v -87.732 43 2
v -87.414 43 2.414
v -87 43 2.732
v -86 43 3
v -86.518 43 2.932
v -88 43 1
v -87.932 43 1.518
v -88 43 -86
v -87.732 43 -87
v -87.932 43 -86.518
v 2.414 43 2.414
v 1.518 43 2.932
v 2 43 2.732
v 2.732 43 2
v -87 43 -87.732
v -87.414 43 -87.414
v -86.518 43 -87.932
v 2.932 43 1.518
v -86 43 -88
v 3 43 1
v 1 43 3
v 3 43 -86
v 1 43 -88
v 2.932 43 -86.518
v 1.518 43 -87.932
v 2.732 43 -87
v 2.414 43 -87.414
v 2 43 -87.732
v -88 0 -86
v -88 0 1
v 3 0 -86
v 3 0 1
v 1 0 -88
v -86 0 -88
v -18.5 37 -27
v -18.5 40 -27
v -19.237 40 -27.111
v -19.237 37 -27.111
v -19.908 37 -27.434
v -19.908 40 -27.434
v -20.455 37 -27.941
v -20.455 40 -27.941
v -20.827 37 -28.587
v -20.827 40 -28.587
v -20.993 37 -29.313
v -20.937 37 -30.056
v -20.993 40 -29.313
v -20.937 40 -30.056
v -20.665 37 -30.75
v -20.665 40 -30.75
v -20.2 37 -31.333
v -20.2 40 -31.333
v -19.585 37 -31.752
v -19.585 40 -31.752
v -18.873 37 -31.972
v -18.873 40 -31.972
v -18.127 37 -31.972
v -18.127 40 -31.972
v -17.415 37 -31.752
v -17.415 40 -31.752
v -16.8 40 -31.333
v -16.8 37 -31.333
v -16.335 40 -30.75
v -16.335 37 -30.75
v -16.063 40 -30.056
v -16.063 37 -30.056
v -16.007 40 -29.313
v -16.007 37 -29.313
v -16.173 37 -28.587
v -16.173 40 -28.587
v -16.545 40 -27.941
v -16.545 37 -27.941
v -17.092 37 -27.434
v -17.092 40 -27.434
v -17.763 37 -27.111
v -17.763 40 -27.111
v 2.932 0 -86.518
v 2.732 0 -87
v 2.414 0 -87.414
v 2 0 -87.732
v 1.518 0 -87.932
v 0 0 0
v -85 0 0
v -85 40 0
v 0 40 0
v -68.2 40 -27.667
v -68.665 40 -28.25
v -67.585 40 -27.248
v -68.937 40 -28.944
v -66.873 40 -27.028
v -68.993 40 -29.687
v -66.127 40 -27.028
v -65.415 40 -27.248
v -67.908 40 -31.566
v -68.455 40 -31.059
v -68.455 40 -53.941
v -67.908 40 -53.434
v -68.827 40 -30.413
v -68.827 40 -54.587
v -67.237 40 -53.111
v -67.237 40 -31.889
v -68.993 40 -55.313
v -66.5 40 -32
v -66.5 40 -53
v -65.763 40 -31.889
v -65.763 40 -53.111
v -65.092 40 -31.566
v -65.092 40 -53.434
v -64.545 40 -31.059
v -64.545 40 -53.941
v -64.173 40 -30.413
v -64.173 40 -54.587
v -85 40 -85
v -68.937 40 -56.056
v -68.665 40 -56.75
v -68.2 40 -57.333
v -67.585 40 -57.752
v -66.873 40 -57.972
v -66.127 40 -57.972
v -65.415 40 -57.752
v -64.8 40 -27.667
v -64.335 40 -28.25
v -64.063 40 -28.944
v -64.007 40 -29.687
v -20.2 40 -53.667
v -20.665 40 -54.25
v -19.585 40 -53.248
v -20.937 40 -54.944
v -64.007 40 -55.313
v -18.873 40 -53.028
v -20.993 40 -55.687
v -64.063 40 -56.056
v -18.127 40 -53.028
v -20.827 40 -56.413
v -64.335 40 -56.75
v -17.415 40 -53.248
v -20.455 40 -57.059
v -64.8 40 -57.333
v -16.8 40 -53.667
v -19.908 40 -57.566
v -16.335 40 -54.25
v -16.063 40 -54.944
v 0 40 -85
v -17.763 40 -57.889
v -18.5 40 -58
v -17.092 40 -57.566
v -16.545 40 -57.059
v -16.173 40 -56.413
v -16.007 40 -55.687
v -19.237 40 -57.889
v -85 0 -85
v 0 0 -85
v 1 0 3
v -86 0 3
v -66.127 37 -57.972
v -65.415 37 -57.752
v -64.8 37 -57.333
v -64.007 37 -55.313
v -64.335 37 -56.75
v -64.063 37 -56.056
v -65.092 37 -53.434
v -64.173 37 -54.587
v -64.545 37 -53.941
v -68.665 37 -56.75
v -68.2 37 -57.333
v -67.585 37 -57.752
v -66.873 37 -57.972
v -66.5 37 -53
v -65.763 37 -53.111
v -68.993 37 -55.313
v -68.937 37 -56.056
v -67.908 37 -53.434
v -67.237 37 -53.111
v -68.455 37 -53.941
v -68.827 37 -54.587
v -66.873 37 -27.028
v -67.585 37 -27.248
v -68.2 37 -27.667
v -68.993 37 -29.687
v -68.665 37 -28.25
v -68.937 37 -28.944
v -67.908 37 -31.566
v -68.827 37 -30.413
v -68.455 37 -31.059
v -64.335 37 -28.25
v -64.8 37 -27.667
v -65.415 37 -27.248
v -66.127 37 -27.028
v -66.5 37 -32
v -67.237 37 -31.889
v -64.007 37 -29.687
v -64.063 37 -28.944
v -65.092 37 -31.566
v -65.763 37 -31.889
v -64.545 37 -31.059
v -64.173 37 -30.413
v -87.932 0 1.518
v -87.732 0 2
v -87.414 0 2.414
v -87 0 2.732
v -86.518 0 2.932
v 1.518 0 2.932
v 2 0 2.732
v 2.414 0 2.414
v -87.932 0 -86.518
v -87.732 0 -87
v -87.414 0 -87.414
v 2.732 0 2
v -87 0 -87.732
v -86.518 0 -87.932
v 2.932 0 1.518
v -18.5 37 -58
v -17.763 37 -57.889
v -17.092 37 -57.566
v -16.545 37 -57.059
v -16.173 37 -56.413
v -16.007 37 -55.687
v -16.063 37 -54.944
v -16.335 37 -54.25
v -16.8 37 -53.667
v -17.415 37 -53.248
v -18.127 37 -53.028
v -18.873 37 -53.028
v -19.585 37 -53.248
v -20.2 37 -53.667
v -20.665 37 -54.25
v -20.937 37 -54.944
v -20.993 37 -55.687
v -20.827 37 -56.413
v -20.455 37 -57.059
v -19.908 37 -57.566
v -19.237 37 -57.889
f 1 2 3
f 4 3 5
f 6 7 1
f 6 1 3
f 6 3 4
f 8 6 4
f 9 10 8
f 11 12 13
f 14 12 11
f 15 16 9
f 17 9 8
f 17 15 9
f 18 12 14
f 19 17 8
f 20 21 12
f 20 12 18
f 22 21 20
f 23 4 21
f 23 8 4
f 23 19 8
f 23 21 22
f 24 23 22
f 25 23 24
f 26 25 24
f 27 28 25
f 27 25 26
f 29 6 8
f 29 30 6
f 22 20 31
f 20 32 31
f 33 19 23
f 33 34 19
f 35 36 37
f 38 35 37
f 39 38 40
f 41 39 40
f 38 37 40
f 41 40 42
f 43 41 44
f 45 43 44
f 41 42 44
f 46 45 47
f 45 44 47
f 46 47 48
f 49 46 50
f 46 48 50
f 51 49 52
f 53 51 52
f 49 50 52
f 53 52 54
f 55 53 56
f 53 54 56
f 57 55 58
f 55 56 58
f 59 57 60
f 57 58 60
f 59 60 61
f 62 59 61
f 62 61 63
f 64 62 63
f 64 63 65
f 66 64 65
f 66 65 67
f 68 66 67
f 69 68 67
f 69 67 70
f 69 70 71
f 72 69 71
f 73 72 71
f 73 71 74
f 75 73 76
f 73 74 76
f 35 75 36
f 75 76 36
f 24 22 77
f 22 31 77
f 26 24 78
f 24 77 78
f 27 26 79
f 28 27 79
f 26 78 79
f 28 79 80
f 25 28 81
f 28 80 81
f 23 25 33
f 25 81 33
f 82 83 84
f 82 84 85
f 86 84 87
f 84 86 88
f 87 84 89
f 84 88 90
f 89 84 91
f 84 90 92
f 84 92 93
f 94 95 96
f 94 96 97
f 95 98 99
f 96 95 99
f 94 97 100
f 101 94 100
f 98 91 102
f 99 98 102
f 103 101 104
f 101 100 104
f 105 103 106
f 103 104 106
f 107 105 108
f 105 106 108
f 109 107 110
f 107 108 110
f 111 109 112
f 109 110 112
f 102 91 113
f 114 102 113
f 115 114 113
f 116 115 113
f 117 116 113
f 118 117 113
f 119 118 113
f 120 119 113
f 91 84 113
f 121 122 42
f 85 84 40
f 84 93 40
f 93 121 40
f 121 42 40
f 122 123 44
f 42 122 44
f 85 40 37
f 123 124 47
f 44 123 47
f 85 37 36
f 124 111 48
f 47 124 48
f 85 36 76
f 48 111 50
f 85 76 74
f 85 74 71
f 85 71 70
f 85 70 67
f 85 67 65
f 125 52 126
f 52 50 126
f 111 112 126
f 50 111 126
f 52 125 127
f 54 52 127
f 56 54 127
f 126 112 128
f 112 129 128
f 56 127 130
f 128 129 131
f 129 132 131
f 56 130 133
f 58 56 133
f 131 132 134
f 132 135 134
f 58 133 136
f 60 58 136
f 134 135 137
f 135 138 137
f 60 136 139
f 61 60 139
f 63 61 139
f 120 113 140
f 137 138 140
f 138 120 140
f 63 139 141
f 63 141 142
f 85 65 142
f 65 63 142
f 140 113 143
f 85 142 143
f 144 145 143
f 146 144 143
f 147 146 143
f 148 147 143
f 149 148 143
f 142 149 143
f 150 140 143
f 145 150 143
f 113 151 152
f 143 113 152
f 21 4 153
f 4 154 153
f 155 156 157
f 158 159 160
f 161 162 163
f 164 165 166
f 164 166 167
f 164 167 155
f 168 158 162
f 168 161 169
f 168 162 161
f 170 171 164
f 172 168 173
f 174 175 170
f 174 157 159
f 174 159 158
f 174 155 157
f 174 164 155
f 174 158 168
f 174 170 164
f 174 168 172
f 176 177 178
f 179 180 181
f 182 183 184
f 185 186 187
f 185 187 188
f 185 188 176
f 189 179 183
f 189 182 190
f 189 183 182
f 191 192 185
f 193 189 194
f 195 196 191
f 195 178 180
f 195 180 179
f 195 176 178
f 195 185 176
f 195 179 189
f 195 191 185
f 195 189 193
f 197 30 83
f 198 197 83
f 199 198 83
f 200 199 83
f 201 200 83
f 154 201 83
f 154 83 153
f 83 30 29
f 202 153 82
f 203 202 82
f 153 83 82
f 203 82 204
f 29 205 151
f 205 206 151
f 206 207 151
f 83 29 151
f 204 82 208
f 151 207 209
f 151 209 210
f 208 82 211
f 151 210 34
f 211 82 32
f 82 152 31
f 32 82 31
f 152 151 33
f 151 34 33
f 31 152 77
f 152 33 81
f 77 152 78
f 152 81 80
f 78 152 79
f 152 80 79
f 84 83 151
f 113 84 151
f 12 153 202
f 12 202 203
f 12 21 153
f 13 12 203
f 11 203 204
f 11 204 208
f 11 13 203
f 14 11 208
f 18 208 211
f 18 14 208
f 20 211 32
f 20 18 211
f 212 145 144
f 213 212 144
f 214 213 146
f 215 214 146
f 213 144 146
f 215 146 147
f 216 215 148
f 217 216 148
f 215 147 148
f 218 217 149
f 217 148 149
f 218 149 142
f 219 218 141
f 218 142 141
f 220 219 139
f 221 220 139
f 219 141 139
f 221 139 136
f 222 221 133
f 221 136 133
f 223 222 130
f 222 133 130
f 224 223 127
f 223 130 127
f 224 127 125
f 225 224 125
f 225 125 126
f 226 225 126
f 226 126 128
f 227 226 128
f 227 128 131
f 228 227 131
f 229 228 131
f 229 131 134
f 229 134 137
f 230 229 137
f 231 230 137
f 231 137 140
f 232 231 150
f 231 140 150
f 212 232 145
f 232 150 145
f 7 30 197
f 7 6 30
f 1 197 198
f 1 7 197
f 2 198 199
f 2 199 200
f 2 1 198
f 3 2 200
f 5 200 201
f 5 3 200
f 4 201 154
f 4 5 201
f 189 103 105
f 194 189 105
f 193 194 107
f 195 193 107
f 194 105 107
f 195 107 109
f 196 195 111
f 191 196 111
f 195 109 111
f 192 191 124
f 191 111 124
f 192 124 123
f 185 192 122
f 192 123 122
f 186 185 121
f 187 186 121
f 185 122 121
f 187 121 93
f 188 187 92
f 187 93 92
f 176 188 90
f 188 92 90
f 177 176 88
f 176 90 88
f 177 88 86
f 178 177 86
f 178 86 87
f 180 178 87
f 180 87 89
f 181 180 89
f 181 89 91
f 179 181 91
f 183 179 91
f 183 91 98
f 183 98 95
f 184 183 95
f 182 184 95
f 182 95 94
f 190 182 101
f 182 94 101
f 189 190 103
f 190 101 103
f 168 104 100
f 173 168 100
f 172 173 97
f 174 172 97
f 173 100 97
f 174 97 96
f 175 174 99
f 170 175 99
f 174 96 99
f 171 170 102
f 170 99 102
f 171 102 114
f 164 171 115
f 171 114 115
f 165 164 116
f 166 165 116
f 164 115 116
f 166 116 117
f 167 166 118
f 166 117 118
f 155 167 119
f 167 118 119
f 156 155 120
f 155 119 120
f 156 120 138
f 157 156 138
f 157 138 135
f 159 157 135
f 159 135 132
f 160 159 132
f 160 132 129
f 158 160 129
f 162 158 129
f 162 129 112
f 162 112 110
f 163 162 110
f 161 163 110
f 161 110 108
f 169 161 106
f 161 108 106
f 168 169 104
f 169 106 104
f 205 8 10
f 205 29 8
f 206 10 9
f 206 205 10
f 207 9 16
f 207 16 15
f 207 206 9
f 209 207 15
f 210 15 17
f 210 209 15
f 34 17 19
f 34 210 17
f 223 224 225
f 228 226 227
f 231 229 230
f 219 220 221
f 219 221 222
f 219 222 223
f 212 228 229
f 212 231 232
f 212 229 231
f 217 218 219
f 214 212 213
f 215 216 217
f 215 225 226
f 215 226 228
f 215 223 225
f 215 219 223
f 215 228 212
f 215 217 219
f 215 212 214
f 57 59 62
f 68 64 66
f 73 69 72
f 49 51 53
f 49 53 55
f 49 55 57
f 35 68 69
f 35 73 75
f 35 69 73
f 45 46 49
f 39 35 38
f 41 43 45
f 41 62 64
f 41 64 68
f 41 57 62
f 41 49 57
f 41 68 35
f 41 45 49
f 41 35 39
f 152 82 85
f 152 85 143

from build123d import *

# Parameters (mm, degrees)
SKETCH1_W           = 91
SKETCH1_H           = 91
SKETCH1_W_2         = 85
SKETCH1_H_2         = 85
BOSS_EXTRUDE1_DEPTH = 40
SKETCH2_W           = 91
SKETCH2_H           = 91
BOSS_EXTRUDE2_DEPTH = 3
FILLET1_R           = 2
SKETCH3_R           = 2.5
BOSS_EXTRUDE3_DEPTH = 3


with BuildPart() as part:
    # Sketch1 → Boss-Extrude1 (new body)
    with BuildSketch(Plane(origin=(0, 0, 0), x_dir=(1, 0, 0), z_dir=(0, 1, 0))):
        with Locations((-42.5, 42.5)):
            Rectangle(SKETCH1_W, SKETCH1_H)
        with Locations((-42.5, 42.5)):
            Rectangle(SKETCH1_W_2, SKETCH1_H_2, mode=Mode.SUBTRACT)
    extrude(amount=BOSS_EXTRUDE1_DEPTH)

    # Sketch2 → Boss-Extrude2 (add)
    with BuildSketch(Plane(origin=(0, 40, 0), x_dir=(1, 0, 0), z_dir=(0, 1, 0))):
        with Locations((-42.5, 42.5)):
            Rectangle(SKETCH2_W, SKETCH2_H)
    extrude(amount=BOSS_EXTRUDE2_DEPTH)

    # Fillet1
    fillet1_edges = [part.edges().sort_by_distance(p)[0] for p in [
        (3, 21.5, -88),
        (3, 21.5, 3),
        (-88, 21.5, 3),
        (-88, 21.5, -88),
    ]]
    fillet(fillet1_edges, radius=FILLET1_R)

    # Sketch3 → Boss-Extrude3 (add)
    with BuildSketch(Plane.XZ.offset(-40)):
        with Locations(Location((-66.5, -29.5, 0), (0, 0, 270))):
            Circle(SKETCH3_R)
        with Locations(Location((-66.5, -55.5, 0), (0, 0, 90))):
            Circle(SKETCH3_R)
        with Locations(Location((-18.5, -55.5, 0), (0, 0, 270))):
            Circle(SKETCH3_R)
        with Locations(Location((-18.5, -29.5, 0), (0, 0, 90))):
            Circle(SKETCH3_R)
    extrude(amount=BOSS_EXTRUDE3_DEPTH)


solid = part.part
